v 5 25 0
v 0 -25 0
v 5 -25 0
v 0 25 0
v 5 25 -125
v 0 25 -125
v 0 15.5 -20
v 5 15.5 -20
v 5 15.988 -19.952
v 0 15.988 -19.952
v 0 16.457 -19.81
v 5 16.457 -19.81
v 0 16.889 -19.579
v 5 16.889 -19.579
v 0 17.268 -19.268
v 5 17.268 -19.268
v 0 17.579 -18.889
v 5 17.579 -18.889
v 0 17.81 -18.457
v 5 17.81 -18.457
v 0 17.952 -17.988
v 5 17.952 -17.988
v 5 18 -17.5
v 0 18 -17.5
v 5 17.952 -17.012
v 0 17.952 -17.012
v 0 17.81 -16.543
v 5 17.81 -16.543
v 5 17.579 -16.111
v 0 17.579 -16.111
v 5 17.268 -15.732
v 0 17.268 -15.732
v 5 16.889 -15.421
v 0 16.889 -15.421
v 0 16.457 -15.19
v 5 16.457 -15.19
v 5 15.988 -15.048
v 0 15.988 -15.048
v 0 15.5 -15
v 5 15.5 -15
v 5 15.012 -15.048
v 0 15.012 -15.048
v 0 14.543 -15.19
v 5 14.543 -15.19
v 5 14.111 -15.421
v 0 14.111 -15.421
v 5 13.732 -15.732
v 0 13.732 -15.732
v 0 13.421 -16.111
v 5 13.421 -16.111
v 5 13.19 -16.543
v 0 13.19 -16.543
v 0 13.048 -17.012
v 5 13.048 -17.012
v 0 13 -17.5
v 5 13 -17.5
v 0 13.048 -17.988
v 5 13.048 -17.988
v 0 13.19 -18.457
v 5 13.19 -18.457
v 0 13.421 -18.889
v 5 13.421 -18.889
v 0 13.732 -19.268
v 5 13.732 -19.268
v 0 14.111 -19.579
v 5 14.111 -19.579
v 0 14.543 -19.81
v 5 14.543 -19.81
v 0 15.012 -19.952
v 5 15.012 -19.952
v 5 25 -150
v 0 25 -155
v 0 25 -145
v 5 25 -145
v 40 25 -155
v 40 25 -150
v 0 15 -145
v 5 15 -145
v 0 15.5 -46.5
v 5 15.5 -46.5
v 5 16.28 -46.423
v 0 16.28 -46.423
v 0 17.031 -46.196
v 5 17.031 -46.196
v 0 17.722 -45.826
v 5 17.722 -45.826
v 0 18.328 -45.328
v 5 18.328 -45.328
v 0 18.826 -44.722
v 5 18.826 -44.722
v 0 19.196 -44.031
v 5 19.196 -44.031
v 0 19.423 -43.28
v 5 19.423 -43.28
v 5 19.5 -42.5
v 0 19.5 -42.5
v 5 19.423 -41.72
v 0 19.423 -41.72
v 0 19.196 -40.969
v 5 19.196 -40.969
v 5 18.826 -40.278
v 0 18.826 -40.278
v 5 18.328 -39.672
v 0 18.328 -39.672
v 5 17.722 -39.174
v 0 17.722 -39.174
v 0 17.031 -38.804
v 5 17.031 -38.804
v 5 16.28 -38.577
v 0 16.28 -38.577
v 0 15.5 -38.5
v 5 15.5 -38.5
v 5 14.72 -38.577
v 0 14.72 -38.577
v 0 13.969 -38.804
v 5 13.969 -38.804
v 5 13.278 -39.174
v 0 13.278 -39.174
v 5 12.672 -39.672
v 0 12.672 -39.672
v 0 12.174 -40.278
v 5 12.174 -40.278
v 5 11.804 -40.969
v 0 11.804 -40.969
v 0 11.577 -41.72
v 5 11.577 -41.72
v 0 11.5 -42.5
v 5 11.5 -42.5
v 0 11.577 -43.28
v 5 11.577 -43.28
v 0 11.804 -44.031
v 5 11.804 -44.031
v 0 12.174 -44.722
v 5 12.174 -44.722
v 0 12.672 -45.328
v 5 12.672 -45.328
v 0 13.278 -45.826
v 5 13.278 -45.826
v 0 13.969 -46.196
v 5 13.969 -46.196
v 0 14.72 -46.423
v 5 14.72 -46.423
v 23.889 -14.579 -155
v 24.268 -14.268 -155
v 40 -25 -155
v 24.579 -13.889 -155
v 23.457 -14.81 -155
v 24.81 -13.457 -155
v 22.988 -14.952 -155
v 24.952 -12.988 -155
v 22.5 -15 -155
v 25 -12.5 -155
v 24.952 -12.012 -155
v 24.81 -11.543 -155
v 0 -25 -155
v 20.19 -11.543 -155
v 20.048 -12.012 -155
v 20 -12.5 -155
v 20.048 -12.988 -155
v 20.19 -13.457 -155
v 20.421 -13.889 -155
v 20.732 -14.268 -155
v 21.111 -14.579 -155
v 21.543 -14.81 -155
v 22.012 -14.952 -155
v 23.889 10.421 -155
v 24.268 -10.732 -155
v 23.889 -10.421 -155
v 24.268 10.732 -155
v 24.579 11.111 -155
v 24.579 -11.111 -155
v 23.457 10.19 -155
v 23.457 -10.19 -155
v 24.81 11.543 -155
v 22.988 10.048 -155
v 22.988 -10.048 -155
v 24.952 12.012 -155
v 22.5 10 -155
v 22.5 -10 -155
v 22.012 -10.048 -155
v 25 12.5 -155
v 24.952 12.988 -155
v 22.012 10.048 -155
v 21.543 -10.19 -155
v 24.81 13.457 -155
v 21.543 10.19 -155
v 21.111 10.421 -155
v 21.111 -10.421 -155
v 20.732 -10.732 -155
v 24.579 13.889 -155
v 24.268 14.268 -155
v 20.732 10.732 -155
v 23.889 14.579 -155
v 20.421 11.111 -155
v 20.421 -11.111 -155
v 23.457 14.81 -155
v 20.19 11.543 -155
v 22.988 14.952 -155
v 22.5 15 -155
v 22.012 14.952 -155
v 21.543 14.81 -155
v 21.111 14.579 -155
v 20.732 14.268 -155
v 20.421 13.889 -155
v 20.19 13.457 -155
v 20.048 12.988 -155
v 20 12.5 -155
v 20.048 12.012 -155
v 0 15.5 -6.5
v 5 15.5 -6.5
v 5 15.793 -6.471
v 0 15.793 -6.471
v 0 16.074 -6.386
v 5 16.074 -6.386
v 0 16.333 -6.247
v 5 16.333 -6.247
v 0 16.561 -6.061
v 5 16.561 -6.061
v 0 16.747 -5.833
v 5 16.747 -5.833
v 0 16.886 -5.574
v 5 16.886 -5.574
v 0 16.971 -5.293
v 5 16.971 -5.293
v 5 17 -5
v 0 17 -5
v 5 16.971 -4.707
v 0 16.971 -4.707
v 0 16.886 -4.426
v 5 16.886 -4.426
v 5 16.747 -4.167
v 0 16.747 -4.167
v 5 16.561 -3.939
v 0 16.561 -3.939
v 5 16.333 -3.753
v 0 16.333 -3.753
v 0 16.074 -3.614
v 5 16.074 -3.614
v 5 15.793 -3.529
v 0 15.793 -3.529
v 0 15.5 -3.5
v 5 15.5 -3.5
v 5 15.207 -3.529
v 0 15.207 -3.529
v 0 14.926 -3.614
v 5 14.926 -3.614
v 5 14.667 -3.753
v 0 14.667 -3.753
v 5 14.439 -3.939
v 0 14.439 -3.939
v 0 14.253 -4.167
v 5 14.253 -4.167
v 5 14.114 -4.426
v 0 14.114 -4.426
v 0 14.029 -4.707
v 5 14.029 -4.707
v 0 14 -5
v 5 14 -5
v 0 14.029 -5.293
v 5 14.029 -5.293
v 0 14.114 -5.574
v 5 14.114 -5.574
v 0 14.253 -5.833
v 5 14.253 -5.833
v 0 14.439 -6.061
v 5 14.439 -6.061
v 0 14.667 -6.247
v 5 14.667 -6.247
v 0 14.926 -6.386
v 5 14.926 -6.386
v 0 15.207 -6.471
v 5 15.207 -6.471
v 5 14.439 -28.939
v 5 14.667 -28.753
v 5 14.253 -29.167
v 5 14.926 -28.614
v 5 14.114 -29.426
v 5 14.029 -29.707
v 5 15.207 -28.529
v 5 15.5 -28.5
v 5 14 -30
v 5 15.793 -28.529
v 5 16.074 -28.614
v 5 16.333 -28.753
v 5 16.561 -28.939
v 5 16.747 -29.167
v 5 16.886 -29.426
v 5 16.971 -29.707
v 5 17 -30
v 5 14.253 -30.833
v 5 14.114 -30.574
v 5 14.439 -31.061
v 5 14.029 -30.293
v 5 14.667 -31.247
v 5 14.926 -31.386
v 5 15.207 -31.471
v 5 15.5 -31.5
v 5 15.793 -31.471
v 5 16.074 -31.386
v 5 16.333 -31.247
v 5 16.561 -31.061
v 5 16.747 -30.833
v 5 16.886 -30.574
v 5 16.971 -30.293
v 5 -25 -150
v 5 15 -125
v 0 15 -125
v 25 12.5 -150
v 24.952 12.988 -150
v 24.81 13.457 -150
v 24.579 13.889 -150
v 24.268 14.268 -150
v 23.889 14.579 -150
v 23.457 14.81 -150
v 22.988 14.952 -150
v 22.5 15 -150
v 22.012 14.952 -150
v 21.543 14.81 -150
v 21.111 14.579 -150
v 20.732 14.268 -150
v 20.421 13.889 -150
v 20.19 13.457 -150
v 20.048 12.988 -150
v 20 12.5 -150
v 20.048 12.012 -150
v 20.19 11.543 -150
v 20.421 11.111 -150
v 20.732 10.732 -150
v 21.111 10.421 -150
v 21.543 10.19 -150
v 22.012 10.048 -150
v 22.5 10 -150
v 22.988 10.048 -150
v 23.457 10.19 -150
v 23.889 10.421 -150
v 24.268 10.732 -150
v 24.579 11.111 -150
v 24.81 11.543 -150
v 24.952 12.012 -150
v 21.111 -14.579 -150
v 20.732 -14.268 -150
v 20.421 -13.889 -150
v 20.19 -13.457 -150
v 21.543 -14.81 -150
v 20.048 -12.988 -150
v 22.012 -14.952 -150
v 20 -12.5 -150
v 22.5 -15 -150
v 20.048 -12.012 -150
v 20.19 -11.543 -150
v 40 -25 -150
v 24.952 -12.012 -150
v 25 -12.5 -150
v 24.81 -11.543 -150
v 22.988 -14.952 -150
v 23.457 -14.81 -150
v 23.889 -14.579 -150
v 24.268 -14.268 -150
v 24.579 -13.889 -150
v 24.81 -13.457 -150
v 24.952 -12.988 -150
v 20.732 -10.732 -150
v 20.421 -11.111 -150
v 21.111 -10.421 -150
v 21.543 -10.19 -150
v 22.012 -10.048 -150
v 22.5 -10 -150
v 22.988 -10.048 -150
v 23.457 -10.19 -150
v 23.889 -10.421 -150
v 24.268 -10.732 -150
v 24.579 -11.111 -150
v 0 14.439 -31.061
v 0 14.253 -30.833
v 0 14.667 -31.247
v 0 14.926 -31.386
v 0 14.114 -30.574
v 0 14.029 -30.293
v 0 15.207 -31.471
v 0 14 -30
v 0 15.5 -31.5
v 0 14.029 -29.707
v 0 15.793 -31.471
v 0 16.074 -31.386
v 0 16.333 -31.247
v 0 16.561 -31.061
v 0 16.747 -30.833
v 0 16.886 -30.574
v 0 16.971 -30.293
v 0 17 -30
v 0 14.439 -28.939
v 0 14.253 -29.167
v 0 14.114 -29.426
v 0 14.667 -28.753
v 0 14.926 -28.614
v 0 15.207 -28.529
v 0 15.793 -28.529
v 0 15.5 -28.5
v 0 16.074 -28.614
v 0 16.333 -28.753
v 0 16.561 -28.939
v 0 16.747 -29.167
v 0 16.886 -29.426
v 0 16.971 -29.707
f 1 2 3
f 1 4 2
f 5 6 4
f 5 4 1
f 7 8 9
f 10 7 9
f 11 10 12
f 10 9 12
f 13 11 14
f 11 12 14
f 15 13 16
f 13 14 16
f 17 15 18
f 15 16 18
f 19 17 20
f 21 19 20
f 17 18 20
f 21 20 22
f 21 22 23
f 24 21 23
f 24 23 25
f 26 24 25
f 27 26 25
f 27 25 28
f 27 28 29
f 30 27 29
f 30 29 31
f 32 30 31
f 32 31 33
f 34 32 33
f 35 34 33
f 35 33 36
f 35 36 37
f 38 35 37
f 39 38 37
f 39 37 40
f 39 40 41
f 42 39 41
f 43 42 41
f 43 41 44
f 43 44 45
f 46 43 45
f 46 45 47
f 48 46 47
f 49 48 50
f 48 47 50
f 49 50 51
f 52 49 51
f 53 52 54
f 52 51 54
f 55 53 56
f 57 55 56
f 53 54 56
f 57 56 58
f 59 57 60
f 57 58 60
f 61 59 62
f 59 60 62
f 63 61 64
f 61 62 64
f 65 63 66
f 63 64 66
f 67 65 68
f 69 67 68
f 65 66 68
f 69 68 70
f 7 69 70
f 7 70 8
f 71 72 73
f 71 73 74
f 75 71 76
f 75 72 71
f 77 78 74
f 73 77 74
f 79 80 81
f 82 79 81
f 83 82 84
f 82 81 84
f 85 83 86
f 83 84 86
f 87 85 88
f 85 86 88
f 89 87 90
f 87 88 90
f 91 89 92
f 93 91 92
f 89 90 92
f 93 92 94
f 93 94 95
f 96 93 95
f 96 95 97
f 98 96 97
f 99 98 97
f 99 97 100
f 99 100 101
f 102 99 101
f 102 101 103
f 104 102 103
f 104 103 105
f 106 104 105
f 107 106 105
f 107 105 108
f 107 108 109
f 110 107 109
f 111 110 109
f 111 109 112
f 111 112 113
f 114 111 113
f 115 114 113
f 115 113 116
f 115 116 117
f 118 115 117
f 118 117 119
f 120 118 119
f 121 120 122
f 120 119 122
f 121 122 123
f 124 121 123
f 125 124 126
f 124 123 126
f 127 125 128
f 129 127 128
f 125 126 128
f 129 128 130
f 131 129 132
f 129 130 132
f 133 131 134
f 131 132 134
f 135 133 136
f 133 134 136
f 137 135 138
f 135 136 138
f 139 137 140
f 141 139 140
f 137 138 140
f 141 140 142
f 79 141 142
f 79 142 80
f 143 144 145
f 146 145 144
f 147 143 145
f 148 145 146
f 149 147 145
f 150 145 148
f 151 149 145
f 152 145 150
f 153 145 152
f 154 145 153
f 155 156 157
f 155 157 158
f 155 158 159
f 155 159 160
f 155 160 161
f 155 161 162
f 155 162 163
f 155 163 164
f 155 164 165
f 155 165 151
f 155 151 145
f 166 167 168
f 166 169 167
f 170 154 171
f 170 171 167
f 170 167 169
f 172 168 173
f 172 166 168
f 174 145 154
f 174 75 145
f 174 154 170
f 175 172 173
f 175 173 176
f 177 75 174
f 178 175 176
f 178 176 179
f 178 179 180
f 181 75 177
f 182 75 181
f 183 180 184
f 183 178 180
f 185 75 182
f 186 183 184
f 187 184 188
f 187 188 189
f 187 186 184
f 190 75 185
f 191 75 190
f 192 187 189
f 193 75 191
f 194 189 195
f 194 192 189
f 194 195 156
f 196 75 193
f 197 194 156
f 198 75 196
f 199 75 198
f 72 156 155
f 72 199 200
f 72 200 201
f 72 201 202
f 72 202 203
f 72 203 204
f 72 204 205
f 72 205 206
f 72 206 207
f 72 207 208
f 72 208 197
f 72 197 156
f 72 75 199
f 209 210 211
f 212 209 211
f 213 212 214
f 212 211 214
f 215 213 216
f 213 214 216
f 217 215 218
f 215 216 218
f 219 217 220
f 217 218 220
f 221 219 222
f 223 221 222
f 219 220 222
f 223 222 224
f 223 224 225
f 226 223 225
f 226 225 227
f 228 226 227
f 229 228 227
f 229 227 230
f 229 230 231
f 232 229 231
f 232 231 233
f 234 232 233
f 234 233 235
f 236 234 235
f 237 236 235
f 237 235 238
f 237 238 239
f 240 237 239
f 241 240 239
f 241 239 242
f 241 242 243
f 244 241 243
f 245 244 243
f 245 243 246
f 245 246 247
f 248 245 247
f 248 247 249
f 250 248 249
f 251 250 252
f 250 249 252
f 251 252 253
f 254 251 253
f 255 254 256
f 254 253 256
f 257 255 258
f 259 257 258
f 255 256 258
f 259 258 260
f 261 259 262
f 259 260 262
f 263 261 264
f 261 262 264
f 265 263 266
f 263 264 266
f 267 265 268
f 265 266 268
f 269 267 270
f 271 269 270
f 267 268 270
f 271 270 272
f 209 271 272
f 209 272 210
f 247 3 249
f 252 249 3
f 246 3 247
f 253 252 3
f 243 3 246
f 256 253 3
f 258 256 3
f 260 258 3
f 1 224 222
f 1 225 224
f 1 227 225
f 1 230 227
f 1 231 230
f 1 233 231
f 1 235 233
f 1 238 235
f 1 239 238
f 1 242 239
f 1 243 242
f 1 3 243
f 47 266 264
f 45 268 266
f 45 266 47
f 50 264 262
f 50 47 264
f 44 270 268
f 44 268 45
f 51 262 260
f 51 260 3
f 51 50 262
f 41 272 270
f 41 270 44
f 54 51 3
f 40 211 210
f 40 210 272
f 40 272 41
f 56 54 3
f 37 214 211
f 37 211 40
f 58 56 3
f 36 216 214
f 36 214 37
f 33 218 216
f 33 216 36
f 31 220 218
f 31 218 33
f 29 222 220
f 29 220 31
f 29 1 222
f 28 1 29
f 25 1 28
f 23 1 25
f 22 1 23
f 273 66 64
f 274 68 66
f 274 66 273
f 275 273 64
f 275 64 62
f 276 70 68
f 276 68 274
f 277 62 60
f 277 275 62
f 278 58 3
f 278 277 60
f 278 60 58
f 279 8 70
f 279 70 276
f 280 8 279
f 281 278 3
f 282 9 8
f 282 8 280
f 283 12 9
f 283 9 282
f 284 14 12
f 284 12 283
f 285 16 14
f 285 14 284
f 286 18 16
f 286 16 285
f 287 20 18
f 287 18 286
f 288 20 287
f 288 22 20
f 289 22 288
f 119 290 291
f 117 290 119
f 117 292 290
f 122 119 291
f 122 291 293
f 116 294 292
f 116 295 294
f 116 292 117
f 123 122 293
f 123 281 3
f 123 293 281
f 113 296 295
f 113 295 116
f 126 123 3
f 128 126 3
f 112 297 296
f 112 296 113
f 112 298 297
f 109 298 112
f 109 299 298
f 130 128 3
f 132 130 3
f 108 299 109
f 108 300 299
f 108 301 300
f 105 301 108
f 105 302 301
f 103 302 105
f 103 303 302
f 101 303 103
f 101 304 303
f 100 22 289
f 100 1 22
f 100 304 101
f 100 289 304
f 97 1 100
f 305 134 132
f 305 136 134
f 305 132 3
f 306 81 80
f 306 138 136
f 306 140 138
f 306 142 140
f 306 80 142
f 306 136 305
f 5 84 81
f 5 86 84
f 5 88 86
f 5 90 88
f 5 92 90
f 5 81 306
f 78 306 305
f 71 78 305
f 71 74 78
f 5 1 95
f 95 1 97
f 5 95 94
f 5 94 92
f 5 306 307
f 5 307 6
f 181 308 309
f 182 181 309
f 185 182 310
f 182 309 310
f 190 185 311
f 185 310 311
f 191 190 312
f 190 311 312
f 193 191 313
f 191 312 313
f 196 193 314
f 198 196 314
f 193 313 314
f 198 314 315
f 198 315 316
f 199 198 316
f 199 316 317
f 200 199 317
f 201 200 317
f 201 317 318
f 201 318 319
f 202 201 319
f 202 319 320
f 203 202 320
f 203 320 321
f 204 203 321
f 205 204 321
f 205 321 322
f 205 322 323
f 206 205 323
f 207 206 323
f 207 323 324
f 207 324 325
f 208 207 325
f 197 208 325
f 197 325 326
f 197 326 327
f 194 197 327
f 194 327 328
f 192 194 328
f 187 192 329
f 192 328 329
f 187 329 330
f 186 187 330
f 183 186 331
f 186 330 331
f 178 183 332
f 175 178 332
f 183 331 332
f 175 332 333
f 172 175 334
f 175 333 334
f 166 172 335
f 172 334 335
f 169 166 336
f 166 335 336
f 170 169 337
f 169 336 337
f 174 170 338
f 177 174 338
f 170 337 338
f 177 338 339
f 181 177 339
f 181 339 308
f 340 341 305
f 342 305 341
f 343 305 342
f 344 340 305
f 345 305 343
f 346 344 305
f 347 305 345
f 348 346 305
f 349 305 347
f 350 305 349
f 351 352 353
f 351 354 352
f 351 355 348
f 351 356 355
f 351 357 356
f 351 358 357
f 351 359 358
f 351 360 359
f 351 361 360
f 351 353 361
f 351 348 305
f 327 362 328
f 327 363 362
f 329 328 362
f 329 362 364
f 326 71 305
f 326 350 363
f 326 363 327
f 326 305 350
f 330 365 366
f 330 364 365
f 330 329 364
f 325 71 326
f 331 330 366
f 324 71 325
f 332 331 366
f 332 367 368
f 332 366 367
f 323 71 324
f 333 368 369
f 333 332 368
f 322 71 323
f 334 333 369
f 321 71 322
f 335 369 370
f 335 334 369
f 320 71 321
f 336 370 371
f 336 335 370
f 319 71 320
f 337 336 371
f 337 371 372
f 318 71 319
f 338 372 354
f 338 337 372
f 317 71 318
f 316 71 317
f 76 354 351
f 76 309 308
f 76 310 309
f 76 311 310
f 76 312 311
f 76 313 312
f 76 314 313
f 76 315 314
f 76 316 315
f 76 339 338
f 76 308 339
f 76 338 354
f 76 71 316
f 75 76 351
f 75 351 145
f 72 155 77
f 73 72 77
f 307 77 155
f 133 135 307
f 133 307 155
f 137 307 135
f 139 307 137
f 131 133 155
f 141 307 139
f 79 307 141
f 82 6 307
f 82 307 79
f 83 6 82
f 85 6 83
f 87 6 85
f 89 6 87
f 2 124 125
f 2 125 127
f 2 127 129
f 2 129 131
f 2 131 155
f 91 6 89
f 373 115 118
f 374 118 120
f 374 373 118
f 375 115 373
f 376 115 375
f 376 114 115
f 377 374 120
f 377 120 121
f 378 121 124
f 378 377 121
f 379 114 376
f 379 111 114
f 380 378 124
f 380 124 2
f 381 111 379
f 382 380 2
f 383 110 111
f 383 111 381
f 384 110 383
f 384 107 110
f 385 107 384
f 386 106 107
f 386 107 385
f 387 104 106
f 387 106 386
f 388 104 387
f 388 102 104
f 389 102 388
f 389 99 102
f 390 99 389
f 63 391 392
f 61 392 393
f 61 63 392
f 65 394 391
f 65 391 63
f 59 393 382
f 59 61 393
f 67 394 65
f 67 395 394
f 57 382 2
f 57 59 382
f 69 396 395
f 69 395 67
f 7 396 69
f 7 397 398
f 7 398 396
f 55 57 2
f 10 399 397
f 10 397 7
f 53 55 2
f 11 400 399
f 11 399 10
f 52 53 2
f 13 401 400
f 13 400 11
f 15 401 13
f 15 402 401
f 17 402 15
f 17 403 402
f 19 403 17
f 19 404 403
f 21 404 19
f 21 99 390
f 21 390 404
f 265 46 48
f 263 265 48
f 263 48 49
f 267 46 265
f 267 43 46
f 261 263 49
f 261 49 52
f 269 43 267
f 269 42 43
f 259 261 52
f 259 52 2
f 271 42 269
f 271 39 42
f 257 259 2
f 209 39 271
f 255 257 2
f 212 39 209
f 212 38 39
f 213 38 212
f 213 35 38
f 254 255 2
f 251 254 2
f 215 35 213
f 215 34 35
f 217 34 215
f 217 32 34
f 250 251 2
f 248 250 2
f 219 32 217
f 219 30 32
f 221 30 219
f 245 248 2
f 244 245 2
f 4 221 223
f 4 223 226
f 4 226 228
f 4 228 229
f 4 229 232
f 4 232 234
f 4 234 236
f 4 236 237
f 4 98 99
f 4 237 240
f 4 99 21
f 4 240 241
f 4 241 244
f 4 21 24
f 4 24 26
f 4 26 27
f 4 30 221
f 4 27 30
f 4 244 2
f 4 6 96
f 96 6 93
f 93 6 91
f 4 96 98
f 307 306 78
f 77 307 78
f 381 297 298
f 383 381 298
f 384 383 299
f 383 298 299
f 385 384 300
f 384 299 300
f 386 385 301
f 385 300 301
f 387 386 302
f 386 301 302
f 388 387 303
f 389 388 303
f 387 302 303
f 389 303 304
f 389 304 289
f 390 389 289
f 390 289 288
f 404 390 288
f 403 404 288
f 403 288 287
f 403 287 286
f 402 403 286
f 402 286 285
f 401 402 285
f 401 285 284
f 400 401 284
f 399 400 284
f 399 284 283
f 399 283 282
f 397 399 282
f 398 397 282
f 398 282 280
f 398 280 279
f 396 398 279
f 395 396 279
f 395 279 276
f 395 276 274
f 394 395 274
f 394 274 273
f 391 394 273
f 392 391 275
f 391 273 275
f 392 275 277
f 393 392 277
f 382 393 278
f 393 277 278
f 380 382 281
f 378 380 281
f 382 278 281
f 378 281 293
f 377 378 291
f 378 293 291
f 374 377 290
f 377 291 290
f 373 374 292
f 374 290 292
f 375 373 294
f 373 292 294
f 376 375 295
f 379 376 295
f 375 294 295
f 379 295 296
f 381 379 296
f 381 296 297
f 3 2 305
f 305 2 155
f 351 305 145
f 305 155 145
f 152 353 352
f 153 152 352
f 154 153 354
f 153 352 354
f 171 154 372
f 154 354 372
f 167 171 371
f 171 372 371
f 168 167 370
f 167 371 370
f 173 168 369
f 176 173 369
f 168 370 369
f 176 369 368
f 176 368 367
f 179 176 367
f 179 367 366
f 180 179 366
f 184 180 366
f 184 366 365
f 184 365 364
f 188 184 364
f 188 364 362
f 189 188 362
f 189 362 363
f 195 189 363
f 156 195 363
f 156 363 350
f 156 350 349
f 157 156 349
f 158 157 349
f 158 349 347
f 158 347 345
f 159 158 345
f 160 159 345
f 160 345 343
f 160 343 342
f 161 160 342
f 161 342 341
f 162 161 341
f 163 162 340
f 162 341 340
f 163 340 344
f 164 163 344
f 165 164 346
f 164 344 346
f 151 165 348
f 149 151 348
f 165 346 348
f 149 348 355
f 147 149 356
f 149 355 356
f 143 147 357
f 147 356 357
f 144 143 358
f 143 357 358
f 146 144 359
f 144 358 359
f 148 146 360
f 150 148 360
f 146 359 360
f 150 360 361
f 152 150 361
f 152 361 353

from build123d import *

# Parameters (mm, degrees)
BOSS_EXTRUDE5_DEPTH = 25
CUT_EXTRUDE2_REACH  = 162.857
SKETCH6_R           = 1.5
SKETCH6_R_2         = 2.5
SKETCH6_R_3         = 4
SKETCH6_W           = 20
SKETCH6_H           = 10
CUT_EXTRUDE3_REACH  = 159.242
SKETCH7_R           = 2.5


with BuildPart() as part:
    # Sketch4 → Boss-Extrude5 (new, symmetric)
    with BuildSketch(Plane(origin=(0, 0, 0), x_dir=(1, 0, 0), z_dir=(0, 1, 0))):
        Polygon((0, 0), (5, 0), (5, 150), (40, 150), (40, 155), (0, 155), align=None)
    extrude(amount=BOSS_EXTRUDE5_DEPTH, both=True)

    # Sketch6 → Cut-Extrude2 (cut, up to next)
    with BuildSketch(Plane(origin=(5, 0, 0), x_dir=(0, 0, -1), z_dir=(1, 0, 0)), mode=Mode.PRIVATE) as cut_extrude2_sk1:
        with Locations((5, 15.5)):
            Circle(SKETCH6_R)
    cut_extrude2_tool1 = extrude(cut_extrude2_sk1.sketch, amount=-CUT_EXTRUDE2_REACH, mode=Mode.PRIVATE) & part.part
    # Sketch6 → Cut-Extrude2 (cut, up to next)
    with BuildSketch(Plane(origin=(5, 0, 0), x_dir=(0, 0, -1), z_dir=(1, 0, 0)), mode=Mode.PRIVATE) as cut_extrude2_sk2:
        with Locations((17.5, 15.5)):
            Circle(SKETCH6_R_2)
    cut_extrude2_tool2 = extrude(cut_extrude2_sk2.sketch, amount=-CUT_EXTRUDE2_REACH, mode=Mode.PRIVATE) & part.part
    # Sketch6 → Cut-Extrude2 (cut, up to next)
    with BuildSketch(Plane(origin=(5, 0, 0), x_dir=(0, 0, -1), z_dir=(1, 0, 0)), mode=Mode.PRIVATE) as cut_extrude2_sk3:
        with Locations((30, 15.5)):
            Circle(SKETCH6_R)
    cut_extrude2_tool3 = extrude(cut_extrude2_sk3.sketch, amount=-CUT_EXTRUDE2_REACH, mode=Mode.PRIVATE) & part.part
    # Sketch6 → Cut-Extrude2 (cut, up to next)
    with BuildSketch(Plane(origin=(5, 0, 0), x_dir=(0, 0, -1), z_dir=(1, 0, 0)), mode=Mode.PRIVATE) as cut_extrude2_sk4:
        with Locations((42.5, 15.5)):
            Circle(SKETCH6_R_3)
    cut_extrude2_tool4 = extrude(cut_extrude2_sk4.sketch, amount=-CUT_EXTRUDE2_REACH, mode=Mode.PRIVATE) & part.part
    # Sketch6 → Cut-Extrude2 (cut, up to next)
    with BuildSketch(Plane(origin=(5, 0, 0), x_dir=(0, 0, -1), z_dir=(1, 0, 0)), mode=Mode.PRIVATE) as cut_extrude2_sk5:
        with Locations((135, 20)):
            Rectangle(SKETCH6_W, SKETCH6_H)
    cut_extrude2_tool5 = extrude(cut_extrude2_sk5.sketch, amount=-CUT_EXTRUDE2_REACH, mode=Mode.PRIVATE) & part.part
    add(cut_extrude2_tool1.solids().sort_by_distance((5, 15.5, -5))[0], mode=Mode.SUBTRACT)
    add(cut_extrude2_tool2.solids().sort_by_distance((5, 15.5, -17.5))[0], mode=Mode.SUBTRACT)
    add(cut_extrude2_tool3.solids().sort_by_distance((5, 15.5, -30))[0], mode=Mode.SUBTRACT)
    add(cut_extrude2_tool4.solids().sort_by_distance((5, 15.5, -42.5))[0], mode=Mode.SUBTRACT)
    add(cut_extrude2_tool5.solids().sort_by_distance((5, 20, -135))[0], mode=Mode.SUBTRACT)

    # Sketch7 → Cut-Extrude3 (cut, up to next)
    with BuildSketch(Plane.XY.offset(-150), mode=Mode.PRIVATE) as cut_extrude3_sk1:
        with Locations((22.5, 12.5)):
            Circle(SKETCH7_R)
    cut_extrude3_tool1 = extrude(cut_extrude3_sk1.sketch, amount=-CUT_EXTRUDE3_REACH, mode=Mode.PRIVATE) & part.part
    # Sketch7 → Cut-Extrude3 (cut, up to next)
    with BuildSketch(Plane.XY.offset(-150), mode=Mode.PRIVATE) as cut_extrude3_sk2:
        with Locations((22.5, -12.5)):
            Circle(SKETCH7_R)
    cut_extrude3_tool2 = extrude(cut_extrude3_sk2.sketch, amount=-CUT_EXTRUDE3_REACH, mode=Mode.PRIVATE) & part.part
    add(cut_extrude3_tool1.solids().sort_by_distance((22.5, 12.5, -150))[0], mode=Mode.SUBTRACT)
    add(cut_extrude3_tool2.solids().sort_by_distance((22.5, -12.5, -150))[0], mode=Mode.SUBTRACT)


solid = part.part
